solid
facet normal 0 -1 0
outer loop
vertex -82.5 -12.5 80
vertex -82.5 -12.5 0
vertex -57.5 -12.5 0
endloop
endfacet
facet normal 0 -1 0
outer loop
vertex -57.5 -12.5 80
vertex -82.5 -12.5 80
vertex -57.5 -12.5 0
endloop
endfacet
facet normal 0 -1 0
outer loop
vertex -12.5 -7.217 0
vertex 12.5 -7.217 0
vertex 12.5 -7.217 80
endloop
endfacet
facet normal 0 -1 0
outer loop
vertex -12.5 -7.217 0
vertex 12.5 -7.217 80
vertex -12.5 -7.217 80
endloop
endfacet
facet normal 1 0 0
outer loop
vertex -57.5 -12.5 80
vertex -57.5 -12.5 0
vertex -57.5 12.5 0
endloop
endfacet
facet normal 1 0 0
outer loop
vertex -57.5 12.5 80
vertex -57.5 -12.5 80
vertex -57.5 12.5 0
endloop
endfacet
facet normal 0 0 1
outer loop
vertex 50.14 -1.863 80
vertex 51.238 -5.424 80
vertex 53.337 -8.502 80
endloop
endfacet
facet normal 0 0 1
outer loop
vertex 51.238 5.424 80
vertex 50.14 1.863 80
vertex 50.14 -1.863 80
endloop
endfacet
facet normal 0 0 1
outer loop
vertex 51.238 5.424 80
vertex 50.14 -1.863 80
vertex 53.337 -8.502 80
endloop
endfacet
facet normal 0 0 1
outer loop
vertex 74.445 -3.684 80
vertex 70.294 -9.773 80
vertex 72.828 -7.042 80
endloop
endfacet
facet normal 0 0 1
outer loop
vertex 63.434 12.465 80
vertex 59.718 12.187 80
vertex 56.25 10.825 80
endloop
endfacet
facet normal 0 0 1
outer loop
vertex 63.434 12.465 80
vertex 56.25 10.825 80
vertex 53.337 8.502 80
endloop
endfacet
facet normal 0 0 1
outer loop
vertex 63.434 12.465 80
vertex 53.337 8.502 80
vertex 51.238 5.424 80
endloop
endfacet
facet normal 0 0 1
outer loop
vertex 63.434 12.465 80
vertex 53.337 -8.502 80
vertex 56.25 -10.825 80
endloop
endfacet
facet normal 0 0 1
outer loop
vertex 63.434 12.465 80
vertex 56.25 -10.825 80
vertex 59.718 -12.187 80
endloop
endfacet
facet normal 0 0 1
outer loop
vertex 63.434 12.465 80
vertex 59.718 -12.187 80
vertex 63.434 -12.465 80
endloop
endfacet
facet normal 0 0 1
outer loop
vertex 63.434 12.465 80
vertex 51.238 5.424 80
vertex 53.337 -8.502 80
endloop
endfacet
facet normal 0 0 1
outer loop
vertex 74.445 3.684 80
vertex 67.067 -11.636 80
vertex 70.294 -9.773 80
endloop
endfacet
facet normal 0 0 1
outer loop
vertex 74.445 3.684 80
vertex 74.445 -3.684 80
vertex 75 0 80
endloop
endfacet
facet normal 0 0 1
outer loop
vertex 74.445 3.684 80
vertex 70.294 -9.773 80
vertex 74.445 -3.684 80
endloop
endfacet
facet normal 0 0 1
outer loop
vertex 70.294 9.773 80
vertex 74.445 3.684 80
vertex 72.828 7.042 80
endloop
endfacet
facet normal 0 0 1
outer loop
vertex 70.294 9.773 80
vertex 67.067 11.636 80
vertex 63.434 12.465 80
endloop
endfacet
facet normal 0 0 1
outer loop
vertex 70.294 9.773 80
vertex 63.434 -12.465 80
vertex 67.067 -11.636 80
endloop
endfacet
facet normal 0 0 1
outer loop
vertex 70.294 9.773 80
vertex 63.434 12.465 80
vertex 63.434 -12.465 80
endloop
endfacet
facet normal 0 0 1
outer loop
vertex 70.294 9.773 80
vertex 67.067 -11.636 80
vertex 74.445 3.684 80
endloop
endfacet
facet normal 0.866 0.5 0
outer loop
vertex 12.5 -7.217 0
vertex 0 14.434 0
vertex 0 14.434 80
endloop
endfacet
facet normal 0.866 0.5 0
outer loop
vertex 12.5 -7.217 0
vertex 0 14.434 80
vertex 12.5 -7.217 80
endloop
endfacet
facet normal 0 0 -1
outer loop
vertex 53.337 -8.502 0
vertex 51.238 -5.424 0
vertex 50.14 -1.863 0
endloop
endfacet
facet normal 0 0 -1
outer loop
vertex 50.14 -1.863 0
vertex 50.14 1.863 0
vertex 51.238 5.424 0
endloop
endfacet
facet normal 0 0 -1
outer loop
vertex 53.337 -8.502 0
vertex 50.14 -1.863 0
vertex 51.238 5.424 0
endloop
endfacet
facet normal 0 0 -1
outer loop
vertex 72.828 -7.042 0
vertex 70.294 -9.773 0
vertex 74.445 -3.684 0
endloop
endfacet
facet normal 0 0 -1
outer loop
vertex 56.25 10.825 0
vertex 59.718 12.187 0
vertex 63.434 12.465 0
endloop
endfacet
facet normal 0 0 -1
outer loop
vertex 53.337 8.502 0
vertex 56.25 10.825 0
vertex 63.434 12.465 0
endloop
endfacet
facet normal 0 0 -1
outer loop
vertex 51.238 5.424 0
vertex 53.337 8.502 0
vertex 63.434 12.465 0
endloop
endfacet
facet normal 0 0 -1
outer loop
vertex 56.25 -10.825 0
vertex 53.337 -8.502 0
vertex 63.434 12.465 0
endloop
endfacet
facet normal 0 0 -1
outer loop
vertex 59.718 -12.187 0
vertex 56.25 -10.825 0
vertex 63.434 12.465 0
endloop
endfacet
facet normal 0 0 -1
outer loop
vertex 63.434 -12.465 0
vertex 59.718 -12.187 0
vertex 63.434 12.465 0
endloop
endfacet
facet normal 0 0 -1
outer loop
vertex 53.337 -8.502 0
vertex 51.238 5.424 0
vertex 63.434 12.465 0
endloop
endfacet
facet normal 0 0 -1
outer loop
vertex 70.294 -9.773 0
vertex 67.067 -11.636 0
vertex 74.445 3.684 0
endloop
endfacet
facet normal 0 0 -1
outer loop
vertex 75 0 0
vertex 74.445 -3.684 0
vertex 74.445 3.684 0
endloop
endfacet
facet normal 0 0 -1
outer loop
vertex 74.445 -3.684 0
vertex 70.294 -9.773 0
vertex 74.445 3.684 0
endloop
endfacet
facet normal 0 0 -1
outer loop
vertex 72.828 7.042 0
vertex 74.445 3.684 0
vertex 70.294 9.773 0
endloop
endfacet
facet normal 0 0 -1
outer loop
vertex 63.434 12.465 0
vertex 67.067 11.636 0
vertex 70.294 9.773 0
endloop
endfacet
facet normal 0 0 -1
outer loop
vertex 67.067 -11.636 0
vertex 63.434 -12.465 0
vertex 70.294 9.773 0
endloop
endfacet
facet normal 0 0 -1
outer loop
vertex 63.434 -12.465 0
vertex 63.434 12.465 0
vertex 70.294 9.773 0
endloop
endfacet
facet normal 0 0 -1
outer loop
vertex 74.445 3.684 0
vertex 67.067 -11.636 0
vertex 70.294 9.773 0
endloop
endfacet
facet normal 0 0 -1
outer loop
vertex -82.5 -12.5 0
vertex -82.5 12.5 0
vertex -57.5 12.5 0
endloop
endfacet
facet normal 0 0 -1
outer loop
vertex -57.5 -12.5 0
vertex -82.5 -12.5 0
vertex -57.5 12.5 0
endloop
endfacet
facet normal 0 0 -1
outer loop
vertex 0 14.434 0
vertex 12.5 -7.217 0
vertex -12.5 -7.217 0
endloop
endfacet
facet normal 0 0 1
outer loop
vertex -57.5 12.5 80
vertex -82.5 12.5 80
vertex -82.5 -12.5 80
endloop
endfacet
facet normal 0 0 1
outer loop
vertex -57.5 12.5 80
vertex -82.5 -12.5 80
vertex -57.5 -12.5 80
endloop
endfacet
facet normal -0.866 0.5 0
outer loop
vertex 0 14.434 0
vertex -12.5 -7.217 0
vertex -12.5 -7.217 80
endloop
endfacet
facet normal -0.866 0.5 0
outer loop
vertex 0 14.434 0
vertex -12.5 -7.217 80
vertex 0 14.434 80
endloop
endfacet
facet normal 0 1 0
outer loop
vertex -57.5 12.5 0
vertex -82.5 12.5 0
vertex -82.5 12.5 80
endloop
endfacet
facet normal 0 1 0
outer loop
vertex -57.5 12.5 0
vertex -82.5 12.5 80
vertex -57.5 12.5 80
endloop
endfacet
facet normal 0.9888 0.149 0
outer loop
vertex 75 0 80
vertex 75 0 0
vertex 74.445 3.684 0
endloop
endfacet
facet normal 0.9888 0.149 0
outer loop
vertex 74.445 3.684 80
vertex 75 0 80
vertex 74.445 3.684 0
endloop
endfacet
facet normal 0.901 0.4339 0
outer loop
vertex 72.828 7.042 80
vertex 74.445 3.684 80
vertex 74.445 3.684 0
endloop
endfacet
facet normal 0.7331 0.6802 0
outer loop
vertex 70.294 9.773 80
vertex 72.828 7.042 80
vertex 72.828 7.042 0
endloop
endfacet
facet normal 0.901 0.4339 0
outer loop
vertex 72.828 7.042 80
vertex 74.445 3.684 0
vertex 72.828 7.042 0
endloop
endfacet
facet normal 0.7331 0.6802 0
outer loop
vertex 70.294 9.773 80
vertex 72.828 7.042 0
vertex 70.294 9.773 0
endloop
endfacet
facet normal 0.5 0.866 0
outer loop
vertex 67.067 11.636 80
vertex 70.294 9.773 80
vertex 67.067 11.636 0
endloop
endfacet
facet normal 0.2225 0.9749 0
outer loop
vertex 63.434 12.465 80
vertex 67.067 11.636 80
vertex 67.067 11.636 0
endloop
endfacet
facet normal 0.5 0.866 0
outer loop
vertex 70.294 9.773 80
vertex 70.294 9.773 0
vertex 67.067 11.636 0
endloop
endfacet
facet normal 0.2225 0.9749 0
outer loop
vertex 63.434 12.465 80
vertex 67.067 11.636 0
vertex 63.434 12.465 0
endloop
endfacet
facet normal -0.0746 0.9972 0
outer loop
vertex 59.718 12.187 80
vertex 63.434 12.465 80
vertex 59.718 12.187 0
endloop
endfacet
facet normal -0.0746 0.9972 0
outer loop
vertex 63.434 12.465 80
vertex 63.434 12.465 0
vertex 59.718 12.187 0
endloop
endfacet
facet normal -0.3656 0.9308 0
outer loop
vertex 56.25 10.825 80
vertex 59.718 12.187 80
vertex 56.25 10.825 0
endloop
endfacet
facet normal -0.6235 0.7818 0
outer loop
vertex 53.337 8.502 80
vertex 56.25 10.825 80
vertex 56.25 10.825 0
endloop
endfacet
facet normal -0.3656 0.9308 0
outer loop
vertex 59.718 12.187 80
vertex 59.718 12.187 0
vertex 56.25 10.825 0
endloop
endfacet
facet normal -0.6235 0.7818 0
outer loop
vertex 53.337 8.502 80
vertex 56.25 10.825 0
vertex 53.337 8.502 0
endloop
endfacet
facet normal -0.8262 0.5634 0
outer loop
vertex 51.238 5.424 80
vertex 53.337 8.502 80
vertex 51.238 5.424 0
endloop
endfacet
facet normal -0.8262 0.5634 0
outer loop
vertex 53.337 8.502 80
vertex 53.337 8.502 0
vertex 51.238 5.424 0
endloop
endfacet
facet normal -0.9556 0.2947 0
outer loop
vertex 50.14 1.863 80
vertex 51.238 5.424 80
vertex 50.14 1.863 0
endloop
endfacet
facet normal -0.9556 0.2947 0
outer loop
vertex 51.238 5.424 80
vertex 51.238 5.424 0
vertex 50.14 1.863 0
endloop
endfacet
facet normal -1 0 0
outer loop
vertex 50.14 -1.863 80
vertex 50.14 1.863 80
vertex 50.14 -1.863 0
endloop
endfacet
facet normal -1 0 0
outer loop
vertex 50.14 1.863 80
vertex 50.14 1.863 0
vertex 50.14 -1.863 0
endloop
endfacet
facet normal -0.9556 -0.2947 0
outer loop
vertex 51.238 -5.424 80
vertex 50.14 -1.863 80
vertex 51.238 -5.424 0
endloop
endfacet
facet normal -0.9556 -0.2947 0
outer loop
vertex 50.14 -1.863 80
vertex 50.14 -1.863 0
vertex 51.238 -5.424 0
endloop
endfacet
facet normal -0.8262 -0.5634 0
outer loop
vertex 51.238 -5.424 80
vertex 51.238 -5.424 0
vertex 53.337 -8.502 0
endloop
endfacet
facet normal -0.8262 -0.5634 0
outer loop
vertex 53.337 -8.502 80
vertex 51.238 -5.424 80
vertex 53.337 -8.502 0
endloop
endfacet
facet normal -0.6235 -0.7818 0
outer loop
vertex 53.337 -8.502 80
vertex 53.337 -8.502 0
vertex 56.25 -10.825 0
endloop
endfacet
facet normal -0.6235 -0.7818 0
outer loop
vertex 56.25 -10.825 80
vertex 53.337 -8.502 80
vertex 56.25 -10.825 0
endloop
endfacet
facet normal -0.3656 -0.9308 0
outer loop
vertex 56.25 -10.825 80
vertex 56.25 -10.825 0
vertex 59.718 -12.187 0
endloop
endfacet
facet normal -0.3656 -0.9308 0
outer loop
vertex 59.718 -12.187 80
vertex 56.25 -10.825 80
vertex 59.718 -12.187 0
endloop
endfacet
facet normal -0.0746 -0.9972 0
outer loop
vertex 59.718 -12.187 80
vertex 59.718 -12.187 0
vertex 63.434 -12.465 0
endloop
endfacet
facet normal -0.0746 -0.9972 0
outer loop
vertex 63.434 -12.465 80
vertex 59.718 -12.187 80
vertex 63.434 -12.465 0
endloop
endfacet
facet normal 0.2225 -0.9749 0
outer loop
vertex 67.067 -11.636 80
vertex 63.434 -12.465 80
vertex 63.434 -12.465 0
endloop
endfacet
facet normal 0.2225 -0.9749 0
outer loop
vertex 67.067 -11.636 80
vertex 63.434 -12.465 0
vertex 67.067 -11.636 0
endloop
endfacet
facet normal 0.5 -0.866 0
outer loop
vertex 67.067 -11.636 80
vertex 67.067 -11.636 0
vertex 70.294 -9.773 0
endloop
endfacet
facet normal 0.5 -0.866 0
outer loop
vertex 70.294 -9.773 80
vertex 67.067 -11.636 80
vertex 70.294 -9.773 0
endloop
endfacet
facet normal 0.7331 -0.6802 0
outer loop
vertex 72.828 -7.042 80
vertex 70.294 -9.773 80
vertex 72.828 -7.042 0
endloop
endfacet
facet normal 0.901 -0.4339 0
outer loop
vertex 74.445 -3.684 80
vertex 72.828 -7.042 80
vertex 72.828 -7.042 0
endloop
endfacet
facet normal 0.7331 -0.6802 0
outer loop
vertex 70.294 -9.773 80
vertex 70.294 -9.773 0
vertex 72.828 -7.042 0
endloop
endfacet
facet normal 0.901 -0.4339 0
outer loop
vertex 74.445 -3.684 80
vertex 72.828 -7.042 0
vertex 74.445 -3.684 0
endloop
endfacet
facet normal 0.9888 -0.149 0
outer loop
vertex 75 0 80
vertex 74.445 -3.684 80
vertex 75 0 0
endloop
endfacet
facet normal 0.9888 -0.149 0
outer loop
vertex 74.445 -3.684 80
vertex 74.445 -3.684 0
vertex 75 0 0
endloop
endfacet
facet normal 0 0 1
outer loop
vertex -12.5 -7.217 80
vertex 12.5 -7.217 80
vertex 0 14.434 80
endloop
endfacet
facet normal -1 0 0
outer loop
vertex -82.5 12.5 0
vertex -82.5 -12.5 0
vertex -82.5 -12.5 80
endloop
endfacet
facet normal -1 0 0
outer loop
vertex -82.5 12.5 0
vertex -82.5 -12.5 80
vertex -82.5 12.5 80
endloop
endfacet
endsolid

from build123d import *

# Parameters (mm, degrees)
SKETCH1_R             = 12.5
BOSS_EXTRUDE1_DEPTH   = 80
BOSS_EXTRUDE1_2_DEPTH = 80
SKETCH1_W             = 25
SKETCH1_H             = 25
BOSS_EXTRUDE1_3_DEPTH = 80


with BuildPart() as part:
    # Sketch1 → Boss-Extrude1 (new body)
    with BuildSketch(Plane.XY):
        with Locations((62.5, 0)):
            Circle(SKETCH1_R)
    extrude(amount=BOSS_EXTRUDE1_DEPTH)


with BuildPart() as body_2:
    # Sketch1 → Boss-Extrude1 2 (new body)
    with BuildSketch(Plane.XY):
        Polygon((-12.5, -7.216878365), (0, 14.43375673), (12.5, -7.216878365), align=None)
    extrude(amount=BOSS_EXTRUDE1_2_DEPTH)


with BuildPart() as body_3:
    # Sketch1 → Boss-Extrude1 3 (new body)
    with BuildSketch(Plane.XY):
        with Locations((-70, 0)):
            Rectangle(SKETCH1_W, SKETCH1_H)
    extrude(amount=BOSS_EXTRUDE1_3_DEPTH)


solid = Compound([part.part, body_2.part, body_3.part])
